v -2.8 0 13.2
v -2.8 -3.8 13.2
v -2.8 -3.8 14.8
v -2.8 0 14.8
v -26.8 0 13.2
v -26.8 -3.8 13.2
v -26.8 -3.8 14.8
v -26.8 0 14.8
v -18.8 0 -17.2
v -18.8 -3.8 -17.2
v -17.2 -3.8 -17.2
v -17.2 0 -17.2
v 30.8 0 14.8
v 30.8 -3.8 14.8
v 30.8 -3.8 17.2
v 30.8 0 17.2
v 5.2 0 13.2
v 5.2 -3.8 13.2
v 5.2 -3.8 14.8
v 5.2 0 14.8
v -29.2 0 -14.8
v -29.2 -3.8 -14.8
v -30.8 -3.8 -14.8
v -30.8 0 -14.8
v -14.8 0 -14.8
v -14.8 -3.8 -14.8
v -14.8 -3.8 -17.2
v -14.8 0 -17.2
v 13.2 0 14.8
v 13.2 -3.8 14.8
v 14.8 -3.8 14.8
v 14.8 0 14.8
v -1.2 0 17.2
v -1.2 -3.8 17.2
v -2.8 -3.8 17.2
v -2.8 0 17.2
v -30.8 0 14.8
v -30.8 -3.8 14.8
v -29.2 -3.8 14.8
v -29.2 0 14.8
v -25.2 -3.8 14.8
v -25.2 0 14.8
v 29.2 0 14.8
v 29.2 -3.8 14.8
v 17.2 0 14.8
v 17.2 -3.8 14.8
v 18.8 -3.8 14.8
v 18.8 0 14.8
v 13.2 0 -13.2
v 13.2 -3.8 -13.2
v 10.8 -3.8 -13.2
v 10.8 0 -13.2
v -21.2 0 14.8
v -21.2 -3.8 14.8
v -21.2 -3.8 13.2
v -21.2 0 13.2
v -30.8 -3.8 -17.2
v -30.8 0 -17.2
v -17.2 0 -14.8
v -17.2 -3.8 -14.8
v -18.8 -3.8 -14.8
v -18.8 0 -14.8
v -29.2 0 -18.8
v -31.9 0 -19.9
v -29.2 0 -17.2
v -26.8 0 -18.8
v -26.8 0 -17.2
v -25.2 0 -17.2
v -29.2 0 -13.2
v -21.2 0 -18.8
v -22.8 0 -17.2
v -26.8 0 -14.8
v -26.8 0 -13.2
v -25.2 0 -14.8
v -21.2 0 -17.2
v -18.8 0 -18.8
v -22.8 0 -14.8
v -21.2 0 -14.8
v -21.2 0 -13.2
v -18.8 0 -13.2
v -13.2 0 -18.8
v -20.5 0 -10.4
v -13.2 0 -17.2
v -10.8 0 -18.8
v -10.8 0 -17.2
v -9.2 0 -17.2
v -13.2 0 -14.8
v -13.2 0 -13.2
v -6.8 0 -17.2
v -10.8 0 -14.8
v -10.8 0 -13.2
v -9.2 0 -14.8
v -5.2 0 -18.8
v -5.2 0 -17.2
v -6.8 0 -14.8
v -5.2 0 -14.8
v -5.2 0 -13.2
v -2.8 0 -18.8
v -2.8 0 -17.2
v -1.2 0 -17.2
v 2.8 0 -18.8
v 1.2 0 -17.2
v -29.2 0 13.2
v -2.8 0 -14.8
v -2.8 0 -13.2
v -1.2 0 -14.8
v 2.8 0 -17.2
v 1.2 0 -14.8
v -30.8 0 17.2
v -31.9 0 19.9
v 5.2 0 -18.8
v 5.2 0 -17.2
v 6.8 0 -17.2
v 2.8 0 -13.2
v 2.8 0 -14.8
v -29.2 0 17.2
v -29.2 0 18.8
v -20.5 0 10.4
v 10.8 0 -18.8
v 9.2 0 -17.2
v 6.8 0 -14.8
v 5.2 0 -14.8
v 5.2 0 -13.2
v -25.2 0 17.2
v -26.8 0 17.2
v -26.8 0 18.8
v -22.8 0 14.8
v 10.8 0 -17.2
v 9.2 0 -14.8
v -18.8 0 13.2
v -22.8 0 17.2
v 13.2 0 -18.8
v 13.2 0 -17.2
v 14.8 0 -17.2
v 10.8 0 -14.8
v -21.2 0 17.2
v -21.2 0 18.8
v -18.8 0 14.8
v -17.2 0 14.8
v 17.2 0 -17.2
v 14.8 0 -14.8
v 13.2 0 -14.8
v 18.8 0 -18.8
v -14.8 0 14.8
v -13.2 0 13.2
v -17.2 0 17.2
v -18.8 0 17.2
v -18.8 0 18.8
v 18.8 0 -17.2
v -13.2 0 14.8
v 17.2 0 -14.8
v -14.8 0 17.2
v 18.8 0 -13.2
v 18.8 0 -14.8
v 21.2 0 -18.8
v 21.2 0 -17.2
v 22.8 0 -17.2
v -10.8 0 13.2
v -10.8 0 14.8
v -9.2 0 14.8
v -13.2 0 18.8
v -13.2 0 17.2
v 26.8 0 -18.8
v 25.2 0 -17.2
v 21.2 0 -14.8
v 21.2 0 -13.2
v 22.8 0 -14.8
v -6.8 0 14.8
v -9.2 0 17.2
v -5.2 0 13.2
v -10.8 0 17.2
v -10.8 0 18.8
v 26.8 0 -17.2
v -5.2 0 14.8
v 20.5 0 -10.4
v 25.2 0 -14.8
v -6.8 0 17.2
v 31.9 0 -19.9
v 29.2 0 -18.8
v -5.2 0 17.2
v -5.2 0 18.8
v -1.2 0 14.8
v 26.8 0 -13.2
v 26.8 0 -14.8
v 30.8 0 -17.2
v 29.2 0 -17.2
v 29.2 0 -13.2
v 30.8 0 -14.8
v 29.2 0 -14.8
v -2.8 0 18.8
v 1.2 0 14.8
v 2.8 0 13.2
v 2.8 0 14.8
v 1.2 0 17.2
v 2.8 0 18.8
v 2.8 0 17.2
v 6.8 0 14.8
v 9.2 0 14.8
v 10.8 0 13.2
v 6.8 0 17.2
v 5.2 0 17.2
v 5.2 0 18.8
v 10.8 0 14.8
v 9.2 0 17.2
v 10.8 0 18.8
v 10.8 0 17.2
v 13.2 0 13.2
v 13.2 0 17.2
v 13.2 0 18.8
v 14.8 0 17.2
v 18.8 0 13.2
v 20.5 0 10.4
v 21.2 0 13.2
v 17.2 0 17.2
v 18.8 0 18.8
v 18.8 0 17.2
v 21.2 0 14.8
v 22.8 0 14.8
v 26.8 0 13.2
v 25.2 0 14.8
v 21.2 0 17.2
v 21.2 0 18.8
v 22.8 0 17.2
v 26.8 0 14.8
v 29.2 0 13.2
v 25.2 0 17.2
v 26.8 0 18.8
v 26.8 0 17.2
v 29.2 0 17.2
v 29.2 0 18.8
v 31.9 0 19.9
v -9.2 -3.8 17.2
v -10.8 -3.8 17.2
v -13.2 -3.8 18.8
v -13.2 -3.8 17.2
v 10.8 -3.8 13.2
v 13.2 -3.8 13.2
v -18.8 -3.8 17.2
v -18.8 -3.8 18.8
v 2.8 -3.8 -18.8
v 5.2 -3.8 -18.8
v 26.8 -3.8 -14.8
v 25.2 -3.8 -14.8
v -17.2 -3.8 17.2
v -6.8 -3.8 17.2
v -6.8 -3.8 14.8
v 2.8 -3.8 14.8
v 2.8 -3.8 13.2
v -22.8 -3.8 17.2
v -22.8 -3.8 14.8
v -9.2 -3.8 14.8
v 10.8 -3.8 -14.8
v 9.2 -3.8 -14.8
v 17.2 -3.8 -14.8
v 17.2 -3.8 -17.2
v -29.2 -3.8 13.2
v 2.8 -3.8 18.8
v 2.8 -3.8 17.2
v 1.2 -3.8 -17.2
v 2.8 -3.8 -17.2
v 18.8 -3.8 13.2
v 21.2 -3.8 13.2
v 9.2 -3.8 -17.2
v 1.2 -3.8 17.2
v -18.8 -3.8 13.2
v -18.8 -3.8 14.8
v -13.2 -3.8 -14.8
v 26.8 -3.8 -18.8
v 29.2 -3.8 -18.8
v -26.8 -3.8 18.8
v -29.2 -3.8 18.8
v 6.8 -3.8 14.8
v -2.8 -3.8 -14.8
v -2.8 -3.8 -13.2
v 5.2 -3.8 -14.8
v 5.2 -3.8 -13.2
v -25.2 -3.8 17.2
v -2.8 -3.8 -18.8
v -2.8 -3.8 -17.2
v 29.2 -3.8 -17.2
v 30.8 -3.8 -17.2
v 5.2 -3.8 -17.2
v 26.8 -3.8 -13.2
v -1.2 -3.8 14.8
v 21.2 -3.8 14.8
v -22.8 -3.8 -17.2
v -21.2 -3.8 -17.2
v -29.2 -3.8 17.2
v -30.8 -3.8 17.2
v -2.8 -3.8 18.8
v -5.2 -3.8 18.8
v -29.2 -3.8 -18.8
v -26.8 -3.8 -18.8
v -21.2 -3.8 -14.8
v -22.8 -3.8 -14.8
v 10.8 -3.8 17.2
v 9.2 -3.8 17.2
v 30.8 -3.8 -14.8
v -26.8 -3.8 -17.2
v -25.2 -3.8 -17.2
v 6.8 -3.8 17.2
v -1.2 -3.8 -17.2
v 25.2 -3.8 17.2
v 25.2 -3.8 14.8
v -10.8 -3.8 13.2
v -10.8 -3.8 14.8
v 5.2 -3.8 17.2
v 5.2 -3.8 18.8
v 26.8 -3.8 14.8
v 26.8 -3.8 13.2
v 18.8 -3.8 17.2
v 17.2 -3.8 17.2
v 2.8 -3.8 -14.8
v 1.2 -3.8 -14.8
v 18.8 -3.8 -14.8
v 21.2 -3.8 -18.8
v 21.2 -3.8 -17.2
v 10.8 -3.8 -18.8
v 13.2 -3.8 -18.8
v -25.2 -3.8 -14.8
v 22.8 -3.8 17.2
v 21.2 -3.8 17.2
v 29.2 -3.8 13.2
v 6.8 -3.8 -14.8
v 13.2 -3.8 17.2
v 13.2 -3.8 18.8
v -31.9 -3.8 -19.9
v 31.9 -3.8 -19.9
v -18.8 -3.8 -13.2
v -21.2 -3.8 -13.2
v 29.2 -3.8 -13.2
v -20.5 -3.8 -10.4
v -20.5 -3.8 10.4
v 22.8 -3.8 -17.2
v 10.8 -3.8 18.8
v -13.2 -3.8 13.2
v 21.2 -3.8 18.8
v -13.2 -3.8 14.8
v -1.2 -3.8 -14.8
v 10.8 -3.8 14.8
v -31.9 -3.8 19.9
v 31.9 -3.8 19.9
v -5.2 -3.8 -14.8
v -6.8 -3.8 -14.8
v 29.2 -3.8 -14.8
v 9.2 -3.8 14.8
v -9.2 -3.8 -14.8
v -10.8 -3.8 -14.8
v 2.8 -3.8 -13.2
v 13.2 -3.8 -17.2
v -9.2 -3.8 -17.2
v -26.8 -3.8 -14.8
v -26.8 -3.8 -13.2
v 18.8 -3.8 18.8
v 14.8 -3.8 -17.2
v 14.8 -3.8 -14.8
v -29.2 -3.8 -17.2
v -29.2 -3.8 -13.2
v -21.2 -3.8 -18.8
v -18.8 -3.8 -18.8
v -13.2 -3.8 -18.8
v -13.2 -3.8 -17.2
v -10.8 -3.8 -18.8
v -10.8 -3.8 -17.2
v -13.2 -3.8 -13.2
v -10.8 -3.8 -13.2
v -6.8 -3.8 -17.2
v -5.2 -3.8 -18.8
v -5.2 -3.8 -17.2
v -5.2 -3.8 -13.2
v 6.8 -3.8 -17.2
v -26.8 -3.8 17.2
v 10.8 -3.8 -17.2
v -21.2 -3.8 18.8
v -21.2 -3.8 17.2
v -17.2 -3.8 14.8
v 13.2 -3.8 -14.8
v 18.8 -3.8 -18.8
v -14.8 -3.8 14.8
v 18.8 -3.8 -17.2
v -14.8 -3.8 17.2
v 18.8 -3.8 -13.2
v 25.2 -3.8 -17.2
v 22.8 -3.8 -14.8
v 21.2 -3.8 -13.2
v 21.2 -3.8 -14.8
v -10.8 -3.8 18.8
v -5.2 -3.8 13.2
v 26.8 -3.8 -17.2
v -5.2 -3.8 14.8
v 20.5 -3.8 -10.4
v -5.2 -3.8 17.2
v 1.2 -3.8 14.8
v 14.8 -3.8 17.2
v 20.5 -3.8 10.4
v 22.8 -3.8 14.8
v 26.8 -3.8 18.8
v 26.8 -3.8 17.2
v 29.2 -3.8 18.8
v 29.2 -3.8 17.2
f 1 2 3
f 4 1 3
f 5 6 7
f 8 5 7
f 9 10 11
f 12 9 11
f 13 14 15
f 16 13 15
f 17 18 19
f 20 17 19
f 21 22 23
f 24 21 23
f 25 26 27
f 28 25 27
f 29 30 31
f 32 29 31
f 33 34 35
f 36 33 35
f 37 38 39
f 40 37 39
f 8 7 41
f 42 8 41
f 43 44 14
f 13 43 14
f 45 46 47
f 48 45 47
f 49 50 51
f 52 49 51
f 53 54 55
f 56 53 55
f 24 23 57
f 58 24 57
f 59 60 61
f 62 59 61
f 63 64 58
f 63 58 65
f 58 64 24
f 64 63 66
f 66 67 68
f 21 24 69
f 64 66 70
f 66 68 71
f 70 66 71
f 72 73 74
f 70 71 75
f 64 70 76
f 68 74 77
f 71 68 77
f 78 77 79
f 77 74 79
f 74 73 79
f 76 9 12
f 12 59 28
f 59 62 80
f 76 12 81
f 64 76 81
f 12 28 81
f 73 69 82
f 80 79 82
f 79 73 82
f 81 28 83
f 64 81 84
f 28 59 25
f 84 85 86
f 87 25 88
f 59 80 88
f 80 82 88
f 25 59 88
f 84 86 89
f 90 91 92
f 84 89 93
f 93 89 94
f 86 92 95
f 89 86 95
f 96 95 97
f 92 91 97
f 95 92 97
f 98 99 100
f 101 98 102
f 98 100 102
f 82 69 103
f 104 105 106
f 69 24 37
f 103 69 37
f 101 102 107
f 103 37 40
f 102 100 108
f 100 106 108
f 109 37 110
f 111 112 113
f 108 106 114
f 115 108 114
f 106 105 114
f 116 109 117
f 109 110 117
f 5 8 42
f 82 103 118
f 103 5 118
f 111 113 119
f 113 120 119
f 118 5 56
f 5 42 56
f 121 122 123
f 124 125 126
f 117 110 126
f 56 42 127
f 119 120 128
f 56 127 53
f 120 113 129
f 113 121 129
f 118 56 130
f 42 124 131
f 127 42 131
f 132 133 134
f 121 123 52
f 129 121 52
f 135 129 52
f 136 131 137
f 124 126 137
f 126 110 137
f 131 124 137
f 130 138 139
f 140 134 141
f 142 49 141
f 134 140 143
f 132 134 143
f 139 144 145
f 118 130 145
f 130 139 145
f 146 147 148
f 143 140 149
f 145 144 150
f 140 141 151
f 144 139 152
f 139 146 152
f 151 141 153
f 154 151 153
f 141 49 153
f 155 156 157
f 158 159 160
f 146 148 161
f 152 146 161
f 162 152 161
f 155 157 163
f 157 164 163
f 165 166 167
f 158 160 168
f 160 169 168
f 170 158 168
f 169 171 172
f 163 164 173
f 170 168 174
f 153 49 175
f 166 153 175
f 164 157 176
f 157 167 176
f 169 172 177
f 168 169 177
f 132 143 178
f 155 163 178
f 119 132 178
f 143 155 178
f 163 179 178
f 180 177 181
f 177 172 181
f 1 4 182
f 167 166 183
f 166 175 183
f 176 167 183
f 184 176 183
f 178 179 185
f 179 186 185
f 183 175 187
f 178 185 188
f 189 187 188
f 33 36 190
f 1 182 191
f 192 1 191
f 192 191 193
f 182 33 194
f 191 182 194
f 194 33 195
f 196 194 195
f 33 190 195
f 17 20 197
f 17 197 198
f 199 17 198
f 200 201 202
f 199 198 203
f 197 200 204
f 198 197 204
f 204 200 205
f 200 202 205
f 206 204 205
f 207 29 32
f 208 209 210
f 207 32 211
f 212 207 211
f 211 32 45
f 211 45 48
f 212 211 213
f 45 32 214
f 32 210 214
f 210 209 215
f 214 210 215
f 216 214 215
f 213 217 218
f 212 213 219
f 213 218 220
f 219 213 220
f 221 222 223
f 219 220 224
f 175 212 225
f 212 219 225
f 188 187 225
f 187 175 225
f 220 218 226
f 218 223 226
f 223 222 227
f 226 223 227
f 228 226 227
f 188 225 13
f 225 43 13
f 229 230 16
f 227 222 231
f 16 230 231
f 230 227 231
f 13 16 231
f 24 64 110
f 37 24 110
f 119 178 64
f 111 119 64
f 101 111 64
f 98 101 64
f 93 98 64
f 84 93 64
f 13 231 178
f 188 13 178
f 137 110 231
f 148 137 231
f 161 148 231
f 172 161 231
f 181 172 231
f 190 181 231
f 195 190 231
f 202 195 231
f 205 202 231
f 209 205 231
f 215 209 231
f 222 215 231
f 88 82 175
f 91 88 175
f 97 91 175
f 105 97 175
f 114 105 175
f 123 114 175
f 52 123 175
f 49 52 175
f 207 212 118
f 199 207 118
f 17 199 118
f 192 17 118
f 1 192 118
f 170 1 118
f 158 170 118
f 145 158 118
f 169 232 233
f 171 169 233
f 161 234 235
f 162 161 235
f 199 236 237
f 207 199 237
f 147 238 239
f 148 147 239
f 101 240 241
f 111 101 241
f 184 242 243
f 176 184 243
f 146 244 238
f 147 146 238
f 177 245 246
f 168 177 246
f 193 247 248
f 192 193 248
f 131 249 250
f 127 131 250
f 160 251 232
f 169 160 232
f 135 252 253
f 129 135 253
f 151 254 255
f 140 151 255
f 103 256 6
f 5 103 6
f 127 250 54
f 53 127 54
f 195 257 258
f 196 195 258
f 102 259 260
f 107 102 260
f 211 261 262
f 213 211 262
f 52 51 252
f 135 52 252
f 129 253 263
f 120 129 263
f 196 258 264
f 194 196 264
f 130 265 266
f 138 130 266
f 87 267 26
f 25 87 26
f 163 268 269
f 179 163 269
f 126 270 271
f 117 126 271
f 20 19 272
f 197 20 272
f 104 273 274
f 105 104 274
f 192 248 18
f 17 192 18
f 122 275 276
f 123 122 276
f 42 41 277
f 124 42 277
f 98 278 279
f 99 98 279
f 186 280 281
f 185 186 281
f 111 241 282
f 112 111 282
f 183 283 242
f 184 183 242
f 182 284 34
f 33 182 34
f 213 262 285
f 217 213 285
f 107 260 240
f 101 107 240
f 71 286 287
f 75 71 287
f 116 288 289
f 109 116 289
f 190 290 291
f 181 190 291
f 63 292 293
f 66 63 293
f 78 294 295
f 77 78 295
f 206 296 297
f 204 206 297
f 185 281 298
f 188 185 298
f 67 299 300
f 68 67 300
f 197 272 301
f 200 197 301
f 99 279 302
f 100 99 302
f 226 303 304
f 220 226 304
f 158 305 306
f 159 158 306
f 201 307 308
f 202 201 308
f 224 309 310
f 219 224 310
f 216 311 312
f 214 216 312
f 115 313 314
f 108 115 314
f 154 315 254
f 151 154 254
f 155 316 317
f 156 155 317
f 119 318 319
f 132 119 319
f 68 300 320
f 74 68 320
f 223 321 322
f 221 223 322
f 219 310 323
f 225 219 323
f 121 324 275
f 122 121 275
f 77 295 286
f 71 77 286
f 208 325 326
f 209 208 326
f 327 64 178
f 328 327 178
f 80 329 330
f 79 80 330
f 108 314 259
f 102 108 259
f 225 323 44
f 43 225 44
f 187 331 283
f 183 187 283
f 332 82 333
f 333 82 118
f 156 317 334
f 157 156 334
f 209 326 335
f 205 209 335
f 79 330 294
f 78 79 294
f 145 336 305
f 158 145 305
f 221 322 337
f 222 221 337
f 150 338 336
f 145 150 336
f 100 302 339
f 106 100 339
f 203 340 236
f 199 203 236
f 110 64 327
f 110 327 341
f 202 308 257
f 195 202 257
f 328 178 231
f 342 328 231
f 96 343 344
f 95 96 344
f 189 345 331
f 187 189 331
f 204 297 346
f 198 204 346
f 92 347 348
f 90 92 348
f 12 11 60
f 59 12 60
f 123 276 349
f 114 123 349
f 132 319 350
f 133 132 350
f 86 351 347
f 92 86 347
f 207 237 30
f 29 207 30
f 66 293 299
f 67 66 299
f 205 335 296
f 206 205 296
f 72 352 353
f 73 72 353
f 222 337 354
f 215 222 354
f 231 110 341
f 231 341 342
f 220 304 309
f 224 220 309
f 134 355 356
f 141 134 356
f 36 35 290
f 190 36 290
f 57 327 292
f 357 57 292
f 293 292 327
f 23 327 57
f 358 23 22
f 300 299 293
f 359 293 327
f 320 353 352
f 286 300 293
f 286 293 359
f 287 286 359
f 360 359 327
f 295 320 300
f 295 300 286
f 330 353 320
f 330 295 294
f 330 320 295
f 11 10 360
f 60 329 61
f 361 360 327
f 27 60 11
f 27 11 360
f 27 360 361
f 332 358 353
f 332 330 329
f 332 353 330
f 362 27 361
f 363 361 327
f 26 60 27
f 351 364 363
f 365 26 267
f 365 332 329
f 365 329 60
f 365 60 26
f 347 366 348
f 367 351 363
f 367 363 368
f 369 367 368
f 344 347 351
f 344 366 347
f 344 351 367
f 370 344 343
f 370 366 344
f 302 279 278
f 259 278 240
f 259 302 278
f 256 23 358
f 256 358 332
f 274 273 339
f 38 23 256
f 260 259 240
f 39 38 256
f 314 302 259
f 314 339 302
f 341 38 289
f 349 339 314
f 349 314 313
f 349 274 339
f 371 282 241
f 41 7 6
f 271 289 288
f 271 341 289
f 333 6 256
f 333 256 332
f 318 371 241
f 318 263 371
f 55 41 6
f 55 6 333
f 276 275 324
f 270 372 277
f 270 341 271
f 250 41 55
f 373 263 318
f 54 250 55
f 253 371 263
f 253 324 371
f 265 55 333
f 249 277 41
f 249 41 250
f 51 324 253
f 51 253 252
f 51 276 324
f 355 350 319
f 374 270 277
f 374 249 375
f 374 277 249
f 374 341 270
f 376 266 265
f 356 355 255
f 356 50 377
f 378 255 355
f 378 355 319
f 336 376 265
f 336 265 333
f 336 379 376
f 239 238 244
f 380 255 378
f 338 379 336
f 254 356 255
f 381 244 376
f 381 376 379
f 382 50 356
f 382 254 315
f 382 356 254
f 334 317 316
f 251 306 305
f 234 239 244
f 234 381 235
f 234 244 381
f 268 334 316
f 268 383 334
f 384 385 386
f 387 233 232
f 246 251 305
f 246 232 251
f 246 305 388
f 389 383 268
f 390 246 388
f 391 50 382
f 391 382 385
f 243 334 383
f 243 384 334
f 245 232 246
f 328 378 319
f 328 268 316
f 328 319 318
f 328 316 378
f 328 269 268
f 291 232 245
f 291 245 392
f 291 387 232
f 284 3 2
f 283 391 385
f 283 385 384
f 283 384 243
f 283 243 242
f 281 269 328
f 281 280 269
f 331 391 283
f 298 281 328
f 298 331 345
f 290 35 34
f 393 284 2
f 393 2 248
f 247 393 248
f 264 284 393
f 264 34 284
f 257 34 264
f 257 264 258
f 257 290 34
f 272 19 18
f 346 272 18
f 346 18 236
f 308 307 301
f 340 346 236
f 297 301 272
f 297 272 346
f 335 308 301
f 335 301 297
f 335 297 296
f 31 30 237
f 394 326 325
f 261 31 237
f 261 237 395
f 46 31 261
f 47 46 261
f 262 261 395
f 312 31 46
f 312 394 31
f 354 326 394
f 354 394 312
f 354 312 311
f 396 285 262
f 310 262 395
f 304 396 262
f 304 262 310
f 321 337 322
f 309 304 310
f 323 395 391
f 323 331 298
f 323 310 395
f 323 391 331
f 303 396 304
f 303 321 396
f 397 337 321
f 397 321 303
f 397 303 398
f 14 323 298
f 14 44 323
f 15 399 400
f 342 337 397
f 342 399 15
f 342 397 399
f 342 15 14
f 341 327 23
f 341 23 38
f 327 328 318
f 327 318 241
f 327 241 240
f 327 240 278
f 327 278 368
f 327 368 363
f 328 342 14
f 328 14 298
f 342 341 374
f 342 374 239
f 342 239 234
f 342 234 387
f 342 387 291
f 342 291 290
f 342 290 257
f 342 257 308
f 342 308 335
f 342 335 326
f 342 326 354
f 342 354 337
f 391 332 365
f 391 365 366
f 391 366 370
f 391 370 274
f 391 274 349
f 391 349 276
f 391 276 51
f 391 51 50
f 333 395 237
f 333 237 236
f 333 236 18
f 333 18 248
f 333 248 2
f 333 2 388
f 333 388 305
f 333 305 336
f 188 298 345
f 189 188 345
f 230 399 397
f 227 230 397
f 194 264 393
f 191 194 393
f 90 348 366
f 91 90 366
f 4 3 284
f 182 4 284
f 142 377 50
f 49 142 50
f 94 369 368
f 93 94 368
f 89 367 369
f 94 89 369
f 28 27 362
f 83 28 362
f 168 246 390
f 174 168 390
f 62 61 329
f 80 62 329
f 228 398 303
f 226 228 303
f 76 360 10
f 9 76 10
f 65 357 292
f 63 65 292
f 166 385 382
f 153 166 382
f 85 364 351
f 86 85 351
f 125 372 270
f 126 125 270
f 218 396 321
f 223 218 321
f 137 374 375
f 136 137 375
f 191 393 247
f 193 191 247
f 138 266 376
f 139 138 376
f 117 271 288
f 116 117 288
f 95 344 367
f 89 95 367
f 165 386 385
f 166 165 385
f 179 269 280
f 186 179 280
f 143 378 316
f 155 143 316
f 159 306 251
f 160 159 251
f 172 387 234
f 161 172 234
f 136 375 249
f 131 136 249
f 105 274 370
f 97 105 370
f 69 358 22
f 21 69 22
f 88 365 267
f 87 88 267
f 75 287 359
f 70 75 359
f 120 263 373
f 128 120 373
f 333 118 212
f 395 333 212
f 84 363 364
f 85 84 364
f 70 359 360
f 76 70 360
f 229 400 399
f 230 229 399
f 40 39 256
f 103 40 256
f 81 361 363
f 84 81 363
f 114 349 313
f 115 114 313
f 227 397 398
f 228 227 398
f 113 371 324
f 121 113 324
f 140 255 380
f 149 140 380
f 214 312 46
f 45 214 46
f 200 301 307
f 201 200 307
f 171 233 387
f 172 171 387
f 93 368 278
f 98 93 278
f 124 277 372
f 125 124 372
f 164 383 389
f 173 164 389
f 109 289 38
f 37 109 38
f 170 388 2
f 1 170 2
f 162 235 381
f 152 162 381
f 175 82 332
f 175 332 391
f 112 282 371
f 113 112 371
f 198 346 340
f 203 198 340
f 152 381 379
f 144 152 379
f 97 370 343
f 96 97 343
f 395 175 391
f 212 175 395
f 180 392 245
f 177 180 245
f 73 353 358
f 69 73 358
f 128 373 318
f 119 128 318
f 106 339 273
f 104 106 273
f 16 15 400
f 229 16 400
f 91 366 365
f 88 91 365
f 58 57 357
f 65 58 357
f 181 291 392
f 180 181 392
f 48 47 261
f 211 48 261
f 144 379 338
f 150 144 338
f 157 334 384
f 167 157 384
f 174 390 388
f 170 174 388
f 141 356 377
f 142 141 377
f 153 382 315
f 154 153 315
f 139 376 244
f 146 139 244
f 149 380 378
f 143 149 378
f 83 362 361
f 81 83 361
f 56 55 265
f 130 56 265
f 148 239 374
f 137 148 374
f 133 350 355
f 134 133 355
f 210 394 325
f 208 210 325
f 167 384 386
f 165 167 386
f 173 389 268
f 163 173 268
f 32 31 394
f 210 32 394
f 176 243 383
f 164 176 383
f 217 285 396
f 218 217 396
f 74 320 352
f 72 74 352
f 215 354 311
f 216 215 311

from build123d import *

# Parameters (mm, degrees)
F0_W     = 63.8
F0_H     = 39.8
F0_W_2   = 41
F0_H_2   = 20.8
F1_DEPTH = 3.8
F3_DEPTH = 25


with BuildPart() as f1:
    # F0 (on Front) → F1 (new body)
    with BuildSketch(Plane.XZ):
        Rectangle(F0_W, F0_H)
        Rectangle(F0_W_2, F0_H_2, mode=Mode.SUBTRACT)
    extrude(amount=F1_DEPTH)

    # F2 (on face) → F3 (cut)
    with BuildSketch(Plane.XZ.offset(3.8)):
        Polygon((-29.2, 17.2), (-30.8, 17.2), (-30.8, 14.8), (-29.2, 14.8), (-29.2, 13.2), (-26.8, 13.2), (-26.8, 14.8), (-25.2, 14.8), (-25.2, 17.2), (-26.8, 17.2), (-26.8, 18.8), (-29.2, 18.8), align=None)
        Polygon((-26.8, -13.2), (-29.2, -13.2), (-29.2, -14.8), (-30.8, -14.8), (-30.8, -17.2), (-29.2, -17.2), (-29.2, -18.8), (-26.8, -18.8), (-26.8, -17.2), (-25.2, -17.2), (-25.2, -14.8), (-26.8, -14.8), align=None)
        Polygon((-18.8, 18.8), (-21.2, 18.8), (-21.2, 17.2), (-22.8, 17.2), (-22.8, 14.8), (-21.2, 14.8), (-21.2, 13.2), (-18.8, 13.2), (-18.8, 14.8), (-17.2, 14.8), (-17.2, 17.2), (-18.8, 17.2), align=None)
        Polygon((-18.8, -13.2), (-21.2, -13.2), (-21.2, -14.8), (-22.8, -14.8), (-22.8, -17.2), (-21.2, -17.2), (-21.2, -18.8), (-18.8, -18.8), (-18.8, -17.2), (-17.2, -17.2), (-17.2, -14.8), (-18.8, -14.8), align=None)
        Polygon((-10.8, 18.8), (-13.2, 18.8), (-13.2, 17.2), (-14.8, 17.2), (-14.8, 14.8), (-13.2, 14.8), (-13.2, 13.2), (-10.8, 13.2), (-10.8, 14.8), (-9.2, 14.8), (-9.2, 17.2), (-10.8, 17.2), align=None)
        Polygon((-10.8, -13.2), (-13.2, -13.2), (-13.2, -14.8), (-14.8, -14.8), (-14.8, -17.2), (-13.2, -17.2), (-13.2, -18.8), (-10.8, -18.8), (-10.8, -17.2), (-9.2, -17.2), (-9.2, -14.8), (-10.8, -14.8), align=None)
        Polygon((-2.8, 18.8), (-5.2, 18.8), (-5.2, 17.2), (-6.8, 17.2), (-6.8, 14.8), (-5.2, 14.8), (-5.2, 13.2), (-2.8, 13.2), (-2.8, 14.8), (-1.2, 14.8), (-1.2, 17.2), (-2.8, 17.2), align=None)
        Polygon((-2.8, -13.2), (-5.2, -13.2), (-5.2, -14.8), (-6.8, -14.8), (-6.8, -17.2), (-5.2, -17.2), (-5.2, -18.8), (-2.8, -18.8), (-2.8, -17.2), (-1.2, -17.2), (-1.2, -14.8), (-2.8, -14.8), align=None)
        Polygon((5.2, 18.8), (2.8, 18.8), (2.8, 17.2), (1.2, 17.2), (1.2, 14.8), (2.8, 14.8), (2.8, 13.2), (5.2, 13.2), (5.2, 14.8), (6.8, 14.8), (6.8, 17.2), (5.2, 17.2), align=None)
        Polygon((5.2, -13.2), (2.8, -13.2), (2.8, -14.8), (1.2, -14.8), (1.2, -17.2), (2.8, -17.2), (2.8, -18.8), (5.2, -18.8), (5.2, -17.2), (6.8, -17.2), (6.8, -14.8), (5.2, -14.8), align=None)
        Polygon((13.2, 18.8), (10.8, 18.8), (10.8, 17.2), (9.2, 17.2), (9.2, 14.8), (10.8, 14.8), (10.8, 13.2), (13.2, 13.2), (13.2, 14.8), (14.8, 14.8), (14.8, 17.2), (13.2, 17.2), align=None)
        Polygon((13.2, -13.2), (10.8, -13.2), (10.8, -14.8), (9.2, -14.8), (9.2, -17.2), (10.8, -17.2), (10.8, -18.8), (13.2, -18.8), (13.2, -17.2), (14.8, -17.2), (14.8, -14.8), (13.2, -14.8), align=None)
        Polygon((21.2, 18.8), (18.8, 18.8), (18.8, 17.2), (17.2, 17.2), (17.2, 14.8), (18.8, 14.8), (18.8, 13.2), (21.2, 13.2), (21.2, 14.8), (22.8, 14.8), (22.8, 17.2), (21.2, 17.2), align=None)
        Polygon((21.2, -13.2), (18.8, -13.2), (18.8, -14.8), (17.2, -14.8), (17.2, -17.2), (18.8, -17.2), (18.8, -18.8), (21.2, -18.8), (21.2, -17.2), (22.8, -17.2), (22.8, -14.8), (21.2, -14.8), align=None)
        Polygon((29.2, 18.8), (26.8, 18.8), (26.8, 17.2), (25.2, 17.2), (25.2, 14.8), (26.8, 14.8), (26.8, 13.2), (29.2, 13.2), (29.2, 14.8), (30.8, 14.8), (30.8, 17.2), (29.2, 17.2), align=None)
        Polygon((29.2, -13.2), (26.8, -13.2), (26.8, -14.8), (25.2, -14.8), (25.2, -17.2), (26.8, -17.2), (26.8, -18.8), (29.2, -18.8), (29.2, -17.2), (30.8, -17.2), (30.8, -14.8), (29.2, -14.8), align=None)
    extrude(amount=-F3_DEPTH, mode=Mode.SUBTRACT)


solid = f1.part
